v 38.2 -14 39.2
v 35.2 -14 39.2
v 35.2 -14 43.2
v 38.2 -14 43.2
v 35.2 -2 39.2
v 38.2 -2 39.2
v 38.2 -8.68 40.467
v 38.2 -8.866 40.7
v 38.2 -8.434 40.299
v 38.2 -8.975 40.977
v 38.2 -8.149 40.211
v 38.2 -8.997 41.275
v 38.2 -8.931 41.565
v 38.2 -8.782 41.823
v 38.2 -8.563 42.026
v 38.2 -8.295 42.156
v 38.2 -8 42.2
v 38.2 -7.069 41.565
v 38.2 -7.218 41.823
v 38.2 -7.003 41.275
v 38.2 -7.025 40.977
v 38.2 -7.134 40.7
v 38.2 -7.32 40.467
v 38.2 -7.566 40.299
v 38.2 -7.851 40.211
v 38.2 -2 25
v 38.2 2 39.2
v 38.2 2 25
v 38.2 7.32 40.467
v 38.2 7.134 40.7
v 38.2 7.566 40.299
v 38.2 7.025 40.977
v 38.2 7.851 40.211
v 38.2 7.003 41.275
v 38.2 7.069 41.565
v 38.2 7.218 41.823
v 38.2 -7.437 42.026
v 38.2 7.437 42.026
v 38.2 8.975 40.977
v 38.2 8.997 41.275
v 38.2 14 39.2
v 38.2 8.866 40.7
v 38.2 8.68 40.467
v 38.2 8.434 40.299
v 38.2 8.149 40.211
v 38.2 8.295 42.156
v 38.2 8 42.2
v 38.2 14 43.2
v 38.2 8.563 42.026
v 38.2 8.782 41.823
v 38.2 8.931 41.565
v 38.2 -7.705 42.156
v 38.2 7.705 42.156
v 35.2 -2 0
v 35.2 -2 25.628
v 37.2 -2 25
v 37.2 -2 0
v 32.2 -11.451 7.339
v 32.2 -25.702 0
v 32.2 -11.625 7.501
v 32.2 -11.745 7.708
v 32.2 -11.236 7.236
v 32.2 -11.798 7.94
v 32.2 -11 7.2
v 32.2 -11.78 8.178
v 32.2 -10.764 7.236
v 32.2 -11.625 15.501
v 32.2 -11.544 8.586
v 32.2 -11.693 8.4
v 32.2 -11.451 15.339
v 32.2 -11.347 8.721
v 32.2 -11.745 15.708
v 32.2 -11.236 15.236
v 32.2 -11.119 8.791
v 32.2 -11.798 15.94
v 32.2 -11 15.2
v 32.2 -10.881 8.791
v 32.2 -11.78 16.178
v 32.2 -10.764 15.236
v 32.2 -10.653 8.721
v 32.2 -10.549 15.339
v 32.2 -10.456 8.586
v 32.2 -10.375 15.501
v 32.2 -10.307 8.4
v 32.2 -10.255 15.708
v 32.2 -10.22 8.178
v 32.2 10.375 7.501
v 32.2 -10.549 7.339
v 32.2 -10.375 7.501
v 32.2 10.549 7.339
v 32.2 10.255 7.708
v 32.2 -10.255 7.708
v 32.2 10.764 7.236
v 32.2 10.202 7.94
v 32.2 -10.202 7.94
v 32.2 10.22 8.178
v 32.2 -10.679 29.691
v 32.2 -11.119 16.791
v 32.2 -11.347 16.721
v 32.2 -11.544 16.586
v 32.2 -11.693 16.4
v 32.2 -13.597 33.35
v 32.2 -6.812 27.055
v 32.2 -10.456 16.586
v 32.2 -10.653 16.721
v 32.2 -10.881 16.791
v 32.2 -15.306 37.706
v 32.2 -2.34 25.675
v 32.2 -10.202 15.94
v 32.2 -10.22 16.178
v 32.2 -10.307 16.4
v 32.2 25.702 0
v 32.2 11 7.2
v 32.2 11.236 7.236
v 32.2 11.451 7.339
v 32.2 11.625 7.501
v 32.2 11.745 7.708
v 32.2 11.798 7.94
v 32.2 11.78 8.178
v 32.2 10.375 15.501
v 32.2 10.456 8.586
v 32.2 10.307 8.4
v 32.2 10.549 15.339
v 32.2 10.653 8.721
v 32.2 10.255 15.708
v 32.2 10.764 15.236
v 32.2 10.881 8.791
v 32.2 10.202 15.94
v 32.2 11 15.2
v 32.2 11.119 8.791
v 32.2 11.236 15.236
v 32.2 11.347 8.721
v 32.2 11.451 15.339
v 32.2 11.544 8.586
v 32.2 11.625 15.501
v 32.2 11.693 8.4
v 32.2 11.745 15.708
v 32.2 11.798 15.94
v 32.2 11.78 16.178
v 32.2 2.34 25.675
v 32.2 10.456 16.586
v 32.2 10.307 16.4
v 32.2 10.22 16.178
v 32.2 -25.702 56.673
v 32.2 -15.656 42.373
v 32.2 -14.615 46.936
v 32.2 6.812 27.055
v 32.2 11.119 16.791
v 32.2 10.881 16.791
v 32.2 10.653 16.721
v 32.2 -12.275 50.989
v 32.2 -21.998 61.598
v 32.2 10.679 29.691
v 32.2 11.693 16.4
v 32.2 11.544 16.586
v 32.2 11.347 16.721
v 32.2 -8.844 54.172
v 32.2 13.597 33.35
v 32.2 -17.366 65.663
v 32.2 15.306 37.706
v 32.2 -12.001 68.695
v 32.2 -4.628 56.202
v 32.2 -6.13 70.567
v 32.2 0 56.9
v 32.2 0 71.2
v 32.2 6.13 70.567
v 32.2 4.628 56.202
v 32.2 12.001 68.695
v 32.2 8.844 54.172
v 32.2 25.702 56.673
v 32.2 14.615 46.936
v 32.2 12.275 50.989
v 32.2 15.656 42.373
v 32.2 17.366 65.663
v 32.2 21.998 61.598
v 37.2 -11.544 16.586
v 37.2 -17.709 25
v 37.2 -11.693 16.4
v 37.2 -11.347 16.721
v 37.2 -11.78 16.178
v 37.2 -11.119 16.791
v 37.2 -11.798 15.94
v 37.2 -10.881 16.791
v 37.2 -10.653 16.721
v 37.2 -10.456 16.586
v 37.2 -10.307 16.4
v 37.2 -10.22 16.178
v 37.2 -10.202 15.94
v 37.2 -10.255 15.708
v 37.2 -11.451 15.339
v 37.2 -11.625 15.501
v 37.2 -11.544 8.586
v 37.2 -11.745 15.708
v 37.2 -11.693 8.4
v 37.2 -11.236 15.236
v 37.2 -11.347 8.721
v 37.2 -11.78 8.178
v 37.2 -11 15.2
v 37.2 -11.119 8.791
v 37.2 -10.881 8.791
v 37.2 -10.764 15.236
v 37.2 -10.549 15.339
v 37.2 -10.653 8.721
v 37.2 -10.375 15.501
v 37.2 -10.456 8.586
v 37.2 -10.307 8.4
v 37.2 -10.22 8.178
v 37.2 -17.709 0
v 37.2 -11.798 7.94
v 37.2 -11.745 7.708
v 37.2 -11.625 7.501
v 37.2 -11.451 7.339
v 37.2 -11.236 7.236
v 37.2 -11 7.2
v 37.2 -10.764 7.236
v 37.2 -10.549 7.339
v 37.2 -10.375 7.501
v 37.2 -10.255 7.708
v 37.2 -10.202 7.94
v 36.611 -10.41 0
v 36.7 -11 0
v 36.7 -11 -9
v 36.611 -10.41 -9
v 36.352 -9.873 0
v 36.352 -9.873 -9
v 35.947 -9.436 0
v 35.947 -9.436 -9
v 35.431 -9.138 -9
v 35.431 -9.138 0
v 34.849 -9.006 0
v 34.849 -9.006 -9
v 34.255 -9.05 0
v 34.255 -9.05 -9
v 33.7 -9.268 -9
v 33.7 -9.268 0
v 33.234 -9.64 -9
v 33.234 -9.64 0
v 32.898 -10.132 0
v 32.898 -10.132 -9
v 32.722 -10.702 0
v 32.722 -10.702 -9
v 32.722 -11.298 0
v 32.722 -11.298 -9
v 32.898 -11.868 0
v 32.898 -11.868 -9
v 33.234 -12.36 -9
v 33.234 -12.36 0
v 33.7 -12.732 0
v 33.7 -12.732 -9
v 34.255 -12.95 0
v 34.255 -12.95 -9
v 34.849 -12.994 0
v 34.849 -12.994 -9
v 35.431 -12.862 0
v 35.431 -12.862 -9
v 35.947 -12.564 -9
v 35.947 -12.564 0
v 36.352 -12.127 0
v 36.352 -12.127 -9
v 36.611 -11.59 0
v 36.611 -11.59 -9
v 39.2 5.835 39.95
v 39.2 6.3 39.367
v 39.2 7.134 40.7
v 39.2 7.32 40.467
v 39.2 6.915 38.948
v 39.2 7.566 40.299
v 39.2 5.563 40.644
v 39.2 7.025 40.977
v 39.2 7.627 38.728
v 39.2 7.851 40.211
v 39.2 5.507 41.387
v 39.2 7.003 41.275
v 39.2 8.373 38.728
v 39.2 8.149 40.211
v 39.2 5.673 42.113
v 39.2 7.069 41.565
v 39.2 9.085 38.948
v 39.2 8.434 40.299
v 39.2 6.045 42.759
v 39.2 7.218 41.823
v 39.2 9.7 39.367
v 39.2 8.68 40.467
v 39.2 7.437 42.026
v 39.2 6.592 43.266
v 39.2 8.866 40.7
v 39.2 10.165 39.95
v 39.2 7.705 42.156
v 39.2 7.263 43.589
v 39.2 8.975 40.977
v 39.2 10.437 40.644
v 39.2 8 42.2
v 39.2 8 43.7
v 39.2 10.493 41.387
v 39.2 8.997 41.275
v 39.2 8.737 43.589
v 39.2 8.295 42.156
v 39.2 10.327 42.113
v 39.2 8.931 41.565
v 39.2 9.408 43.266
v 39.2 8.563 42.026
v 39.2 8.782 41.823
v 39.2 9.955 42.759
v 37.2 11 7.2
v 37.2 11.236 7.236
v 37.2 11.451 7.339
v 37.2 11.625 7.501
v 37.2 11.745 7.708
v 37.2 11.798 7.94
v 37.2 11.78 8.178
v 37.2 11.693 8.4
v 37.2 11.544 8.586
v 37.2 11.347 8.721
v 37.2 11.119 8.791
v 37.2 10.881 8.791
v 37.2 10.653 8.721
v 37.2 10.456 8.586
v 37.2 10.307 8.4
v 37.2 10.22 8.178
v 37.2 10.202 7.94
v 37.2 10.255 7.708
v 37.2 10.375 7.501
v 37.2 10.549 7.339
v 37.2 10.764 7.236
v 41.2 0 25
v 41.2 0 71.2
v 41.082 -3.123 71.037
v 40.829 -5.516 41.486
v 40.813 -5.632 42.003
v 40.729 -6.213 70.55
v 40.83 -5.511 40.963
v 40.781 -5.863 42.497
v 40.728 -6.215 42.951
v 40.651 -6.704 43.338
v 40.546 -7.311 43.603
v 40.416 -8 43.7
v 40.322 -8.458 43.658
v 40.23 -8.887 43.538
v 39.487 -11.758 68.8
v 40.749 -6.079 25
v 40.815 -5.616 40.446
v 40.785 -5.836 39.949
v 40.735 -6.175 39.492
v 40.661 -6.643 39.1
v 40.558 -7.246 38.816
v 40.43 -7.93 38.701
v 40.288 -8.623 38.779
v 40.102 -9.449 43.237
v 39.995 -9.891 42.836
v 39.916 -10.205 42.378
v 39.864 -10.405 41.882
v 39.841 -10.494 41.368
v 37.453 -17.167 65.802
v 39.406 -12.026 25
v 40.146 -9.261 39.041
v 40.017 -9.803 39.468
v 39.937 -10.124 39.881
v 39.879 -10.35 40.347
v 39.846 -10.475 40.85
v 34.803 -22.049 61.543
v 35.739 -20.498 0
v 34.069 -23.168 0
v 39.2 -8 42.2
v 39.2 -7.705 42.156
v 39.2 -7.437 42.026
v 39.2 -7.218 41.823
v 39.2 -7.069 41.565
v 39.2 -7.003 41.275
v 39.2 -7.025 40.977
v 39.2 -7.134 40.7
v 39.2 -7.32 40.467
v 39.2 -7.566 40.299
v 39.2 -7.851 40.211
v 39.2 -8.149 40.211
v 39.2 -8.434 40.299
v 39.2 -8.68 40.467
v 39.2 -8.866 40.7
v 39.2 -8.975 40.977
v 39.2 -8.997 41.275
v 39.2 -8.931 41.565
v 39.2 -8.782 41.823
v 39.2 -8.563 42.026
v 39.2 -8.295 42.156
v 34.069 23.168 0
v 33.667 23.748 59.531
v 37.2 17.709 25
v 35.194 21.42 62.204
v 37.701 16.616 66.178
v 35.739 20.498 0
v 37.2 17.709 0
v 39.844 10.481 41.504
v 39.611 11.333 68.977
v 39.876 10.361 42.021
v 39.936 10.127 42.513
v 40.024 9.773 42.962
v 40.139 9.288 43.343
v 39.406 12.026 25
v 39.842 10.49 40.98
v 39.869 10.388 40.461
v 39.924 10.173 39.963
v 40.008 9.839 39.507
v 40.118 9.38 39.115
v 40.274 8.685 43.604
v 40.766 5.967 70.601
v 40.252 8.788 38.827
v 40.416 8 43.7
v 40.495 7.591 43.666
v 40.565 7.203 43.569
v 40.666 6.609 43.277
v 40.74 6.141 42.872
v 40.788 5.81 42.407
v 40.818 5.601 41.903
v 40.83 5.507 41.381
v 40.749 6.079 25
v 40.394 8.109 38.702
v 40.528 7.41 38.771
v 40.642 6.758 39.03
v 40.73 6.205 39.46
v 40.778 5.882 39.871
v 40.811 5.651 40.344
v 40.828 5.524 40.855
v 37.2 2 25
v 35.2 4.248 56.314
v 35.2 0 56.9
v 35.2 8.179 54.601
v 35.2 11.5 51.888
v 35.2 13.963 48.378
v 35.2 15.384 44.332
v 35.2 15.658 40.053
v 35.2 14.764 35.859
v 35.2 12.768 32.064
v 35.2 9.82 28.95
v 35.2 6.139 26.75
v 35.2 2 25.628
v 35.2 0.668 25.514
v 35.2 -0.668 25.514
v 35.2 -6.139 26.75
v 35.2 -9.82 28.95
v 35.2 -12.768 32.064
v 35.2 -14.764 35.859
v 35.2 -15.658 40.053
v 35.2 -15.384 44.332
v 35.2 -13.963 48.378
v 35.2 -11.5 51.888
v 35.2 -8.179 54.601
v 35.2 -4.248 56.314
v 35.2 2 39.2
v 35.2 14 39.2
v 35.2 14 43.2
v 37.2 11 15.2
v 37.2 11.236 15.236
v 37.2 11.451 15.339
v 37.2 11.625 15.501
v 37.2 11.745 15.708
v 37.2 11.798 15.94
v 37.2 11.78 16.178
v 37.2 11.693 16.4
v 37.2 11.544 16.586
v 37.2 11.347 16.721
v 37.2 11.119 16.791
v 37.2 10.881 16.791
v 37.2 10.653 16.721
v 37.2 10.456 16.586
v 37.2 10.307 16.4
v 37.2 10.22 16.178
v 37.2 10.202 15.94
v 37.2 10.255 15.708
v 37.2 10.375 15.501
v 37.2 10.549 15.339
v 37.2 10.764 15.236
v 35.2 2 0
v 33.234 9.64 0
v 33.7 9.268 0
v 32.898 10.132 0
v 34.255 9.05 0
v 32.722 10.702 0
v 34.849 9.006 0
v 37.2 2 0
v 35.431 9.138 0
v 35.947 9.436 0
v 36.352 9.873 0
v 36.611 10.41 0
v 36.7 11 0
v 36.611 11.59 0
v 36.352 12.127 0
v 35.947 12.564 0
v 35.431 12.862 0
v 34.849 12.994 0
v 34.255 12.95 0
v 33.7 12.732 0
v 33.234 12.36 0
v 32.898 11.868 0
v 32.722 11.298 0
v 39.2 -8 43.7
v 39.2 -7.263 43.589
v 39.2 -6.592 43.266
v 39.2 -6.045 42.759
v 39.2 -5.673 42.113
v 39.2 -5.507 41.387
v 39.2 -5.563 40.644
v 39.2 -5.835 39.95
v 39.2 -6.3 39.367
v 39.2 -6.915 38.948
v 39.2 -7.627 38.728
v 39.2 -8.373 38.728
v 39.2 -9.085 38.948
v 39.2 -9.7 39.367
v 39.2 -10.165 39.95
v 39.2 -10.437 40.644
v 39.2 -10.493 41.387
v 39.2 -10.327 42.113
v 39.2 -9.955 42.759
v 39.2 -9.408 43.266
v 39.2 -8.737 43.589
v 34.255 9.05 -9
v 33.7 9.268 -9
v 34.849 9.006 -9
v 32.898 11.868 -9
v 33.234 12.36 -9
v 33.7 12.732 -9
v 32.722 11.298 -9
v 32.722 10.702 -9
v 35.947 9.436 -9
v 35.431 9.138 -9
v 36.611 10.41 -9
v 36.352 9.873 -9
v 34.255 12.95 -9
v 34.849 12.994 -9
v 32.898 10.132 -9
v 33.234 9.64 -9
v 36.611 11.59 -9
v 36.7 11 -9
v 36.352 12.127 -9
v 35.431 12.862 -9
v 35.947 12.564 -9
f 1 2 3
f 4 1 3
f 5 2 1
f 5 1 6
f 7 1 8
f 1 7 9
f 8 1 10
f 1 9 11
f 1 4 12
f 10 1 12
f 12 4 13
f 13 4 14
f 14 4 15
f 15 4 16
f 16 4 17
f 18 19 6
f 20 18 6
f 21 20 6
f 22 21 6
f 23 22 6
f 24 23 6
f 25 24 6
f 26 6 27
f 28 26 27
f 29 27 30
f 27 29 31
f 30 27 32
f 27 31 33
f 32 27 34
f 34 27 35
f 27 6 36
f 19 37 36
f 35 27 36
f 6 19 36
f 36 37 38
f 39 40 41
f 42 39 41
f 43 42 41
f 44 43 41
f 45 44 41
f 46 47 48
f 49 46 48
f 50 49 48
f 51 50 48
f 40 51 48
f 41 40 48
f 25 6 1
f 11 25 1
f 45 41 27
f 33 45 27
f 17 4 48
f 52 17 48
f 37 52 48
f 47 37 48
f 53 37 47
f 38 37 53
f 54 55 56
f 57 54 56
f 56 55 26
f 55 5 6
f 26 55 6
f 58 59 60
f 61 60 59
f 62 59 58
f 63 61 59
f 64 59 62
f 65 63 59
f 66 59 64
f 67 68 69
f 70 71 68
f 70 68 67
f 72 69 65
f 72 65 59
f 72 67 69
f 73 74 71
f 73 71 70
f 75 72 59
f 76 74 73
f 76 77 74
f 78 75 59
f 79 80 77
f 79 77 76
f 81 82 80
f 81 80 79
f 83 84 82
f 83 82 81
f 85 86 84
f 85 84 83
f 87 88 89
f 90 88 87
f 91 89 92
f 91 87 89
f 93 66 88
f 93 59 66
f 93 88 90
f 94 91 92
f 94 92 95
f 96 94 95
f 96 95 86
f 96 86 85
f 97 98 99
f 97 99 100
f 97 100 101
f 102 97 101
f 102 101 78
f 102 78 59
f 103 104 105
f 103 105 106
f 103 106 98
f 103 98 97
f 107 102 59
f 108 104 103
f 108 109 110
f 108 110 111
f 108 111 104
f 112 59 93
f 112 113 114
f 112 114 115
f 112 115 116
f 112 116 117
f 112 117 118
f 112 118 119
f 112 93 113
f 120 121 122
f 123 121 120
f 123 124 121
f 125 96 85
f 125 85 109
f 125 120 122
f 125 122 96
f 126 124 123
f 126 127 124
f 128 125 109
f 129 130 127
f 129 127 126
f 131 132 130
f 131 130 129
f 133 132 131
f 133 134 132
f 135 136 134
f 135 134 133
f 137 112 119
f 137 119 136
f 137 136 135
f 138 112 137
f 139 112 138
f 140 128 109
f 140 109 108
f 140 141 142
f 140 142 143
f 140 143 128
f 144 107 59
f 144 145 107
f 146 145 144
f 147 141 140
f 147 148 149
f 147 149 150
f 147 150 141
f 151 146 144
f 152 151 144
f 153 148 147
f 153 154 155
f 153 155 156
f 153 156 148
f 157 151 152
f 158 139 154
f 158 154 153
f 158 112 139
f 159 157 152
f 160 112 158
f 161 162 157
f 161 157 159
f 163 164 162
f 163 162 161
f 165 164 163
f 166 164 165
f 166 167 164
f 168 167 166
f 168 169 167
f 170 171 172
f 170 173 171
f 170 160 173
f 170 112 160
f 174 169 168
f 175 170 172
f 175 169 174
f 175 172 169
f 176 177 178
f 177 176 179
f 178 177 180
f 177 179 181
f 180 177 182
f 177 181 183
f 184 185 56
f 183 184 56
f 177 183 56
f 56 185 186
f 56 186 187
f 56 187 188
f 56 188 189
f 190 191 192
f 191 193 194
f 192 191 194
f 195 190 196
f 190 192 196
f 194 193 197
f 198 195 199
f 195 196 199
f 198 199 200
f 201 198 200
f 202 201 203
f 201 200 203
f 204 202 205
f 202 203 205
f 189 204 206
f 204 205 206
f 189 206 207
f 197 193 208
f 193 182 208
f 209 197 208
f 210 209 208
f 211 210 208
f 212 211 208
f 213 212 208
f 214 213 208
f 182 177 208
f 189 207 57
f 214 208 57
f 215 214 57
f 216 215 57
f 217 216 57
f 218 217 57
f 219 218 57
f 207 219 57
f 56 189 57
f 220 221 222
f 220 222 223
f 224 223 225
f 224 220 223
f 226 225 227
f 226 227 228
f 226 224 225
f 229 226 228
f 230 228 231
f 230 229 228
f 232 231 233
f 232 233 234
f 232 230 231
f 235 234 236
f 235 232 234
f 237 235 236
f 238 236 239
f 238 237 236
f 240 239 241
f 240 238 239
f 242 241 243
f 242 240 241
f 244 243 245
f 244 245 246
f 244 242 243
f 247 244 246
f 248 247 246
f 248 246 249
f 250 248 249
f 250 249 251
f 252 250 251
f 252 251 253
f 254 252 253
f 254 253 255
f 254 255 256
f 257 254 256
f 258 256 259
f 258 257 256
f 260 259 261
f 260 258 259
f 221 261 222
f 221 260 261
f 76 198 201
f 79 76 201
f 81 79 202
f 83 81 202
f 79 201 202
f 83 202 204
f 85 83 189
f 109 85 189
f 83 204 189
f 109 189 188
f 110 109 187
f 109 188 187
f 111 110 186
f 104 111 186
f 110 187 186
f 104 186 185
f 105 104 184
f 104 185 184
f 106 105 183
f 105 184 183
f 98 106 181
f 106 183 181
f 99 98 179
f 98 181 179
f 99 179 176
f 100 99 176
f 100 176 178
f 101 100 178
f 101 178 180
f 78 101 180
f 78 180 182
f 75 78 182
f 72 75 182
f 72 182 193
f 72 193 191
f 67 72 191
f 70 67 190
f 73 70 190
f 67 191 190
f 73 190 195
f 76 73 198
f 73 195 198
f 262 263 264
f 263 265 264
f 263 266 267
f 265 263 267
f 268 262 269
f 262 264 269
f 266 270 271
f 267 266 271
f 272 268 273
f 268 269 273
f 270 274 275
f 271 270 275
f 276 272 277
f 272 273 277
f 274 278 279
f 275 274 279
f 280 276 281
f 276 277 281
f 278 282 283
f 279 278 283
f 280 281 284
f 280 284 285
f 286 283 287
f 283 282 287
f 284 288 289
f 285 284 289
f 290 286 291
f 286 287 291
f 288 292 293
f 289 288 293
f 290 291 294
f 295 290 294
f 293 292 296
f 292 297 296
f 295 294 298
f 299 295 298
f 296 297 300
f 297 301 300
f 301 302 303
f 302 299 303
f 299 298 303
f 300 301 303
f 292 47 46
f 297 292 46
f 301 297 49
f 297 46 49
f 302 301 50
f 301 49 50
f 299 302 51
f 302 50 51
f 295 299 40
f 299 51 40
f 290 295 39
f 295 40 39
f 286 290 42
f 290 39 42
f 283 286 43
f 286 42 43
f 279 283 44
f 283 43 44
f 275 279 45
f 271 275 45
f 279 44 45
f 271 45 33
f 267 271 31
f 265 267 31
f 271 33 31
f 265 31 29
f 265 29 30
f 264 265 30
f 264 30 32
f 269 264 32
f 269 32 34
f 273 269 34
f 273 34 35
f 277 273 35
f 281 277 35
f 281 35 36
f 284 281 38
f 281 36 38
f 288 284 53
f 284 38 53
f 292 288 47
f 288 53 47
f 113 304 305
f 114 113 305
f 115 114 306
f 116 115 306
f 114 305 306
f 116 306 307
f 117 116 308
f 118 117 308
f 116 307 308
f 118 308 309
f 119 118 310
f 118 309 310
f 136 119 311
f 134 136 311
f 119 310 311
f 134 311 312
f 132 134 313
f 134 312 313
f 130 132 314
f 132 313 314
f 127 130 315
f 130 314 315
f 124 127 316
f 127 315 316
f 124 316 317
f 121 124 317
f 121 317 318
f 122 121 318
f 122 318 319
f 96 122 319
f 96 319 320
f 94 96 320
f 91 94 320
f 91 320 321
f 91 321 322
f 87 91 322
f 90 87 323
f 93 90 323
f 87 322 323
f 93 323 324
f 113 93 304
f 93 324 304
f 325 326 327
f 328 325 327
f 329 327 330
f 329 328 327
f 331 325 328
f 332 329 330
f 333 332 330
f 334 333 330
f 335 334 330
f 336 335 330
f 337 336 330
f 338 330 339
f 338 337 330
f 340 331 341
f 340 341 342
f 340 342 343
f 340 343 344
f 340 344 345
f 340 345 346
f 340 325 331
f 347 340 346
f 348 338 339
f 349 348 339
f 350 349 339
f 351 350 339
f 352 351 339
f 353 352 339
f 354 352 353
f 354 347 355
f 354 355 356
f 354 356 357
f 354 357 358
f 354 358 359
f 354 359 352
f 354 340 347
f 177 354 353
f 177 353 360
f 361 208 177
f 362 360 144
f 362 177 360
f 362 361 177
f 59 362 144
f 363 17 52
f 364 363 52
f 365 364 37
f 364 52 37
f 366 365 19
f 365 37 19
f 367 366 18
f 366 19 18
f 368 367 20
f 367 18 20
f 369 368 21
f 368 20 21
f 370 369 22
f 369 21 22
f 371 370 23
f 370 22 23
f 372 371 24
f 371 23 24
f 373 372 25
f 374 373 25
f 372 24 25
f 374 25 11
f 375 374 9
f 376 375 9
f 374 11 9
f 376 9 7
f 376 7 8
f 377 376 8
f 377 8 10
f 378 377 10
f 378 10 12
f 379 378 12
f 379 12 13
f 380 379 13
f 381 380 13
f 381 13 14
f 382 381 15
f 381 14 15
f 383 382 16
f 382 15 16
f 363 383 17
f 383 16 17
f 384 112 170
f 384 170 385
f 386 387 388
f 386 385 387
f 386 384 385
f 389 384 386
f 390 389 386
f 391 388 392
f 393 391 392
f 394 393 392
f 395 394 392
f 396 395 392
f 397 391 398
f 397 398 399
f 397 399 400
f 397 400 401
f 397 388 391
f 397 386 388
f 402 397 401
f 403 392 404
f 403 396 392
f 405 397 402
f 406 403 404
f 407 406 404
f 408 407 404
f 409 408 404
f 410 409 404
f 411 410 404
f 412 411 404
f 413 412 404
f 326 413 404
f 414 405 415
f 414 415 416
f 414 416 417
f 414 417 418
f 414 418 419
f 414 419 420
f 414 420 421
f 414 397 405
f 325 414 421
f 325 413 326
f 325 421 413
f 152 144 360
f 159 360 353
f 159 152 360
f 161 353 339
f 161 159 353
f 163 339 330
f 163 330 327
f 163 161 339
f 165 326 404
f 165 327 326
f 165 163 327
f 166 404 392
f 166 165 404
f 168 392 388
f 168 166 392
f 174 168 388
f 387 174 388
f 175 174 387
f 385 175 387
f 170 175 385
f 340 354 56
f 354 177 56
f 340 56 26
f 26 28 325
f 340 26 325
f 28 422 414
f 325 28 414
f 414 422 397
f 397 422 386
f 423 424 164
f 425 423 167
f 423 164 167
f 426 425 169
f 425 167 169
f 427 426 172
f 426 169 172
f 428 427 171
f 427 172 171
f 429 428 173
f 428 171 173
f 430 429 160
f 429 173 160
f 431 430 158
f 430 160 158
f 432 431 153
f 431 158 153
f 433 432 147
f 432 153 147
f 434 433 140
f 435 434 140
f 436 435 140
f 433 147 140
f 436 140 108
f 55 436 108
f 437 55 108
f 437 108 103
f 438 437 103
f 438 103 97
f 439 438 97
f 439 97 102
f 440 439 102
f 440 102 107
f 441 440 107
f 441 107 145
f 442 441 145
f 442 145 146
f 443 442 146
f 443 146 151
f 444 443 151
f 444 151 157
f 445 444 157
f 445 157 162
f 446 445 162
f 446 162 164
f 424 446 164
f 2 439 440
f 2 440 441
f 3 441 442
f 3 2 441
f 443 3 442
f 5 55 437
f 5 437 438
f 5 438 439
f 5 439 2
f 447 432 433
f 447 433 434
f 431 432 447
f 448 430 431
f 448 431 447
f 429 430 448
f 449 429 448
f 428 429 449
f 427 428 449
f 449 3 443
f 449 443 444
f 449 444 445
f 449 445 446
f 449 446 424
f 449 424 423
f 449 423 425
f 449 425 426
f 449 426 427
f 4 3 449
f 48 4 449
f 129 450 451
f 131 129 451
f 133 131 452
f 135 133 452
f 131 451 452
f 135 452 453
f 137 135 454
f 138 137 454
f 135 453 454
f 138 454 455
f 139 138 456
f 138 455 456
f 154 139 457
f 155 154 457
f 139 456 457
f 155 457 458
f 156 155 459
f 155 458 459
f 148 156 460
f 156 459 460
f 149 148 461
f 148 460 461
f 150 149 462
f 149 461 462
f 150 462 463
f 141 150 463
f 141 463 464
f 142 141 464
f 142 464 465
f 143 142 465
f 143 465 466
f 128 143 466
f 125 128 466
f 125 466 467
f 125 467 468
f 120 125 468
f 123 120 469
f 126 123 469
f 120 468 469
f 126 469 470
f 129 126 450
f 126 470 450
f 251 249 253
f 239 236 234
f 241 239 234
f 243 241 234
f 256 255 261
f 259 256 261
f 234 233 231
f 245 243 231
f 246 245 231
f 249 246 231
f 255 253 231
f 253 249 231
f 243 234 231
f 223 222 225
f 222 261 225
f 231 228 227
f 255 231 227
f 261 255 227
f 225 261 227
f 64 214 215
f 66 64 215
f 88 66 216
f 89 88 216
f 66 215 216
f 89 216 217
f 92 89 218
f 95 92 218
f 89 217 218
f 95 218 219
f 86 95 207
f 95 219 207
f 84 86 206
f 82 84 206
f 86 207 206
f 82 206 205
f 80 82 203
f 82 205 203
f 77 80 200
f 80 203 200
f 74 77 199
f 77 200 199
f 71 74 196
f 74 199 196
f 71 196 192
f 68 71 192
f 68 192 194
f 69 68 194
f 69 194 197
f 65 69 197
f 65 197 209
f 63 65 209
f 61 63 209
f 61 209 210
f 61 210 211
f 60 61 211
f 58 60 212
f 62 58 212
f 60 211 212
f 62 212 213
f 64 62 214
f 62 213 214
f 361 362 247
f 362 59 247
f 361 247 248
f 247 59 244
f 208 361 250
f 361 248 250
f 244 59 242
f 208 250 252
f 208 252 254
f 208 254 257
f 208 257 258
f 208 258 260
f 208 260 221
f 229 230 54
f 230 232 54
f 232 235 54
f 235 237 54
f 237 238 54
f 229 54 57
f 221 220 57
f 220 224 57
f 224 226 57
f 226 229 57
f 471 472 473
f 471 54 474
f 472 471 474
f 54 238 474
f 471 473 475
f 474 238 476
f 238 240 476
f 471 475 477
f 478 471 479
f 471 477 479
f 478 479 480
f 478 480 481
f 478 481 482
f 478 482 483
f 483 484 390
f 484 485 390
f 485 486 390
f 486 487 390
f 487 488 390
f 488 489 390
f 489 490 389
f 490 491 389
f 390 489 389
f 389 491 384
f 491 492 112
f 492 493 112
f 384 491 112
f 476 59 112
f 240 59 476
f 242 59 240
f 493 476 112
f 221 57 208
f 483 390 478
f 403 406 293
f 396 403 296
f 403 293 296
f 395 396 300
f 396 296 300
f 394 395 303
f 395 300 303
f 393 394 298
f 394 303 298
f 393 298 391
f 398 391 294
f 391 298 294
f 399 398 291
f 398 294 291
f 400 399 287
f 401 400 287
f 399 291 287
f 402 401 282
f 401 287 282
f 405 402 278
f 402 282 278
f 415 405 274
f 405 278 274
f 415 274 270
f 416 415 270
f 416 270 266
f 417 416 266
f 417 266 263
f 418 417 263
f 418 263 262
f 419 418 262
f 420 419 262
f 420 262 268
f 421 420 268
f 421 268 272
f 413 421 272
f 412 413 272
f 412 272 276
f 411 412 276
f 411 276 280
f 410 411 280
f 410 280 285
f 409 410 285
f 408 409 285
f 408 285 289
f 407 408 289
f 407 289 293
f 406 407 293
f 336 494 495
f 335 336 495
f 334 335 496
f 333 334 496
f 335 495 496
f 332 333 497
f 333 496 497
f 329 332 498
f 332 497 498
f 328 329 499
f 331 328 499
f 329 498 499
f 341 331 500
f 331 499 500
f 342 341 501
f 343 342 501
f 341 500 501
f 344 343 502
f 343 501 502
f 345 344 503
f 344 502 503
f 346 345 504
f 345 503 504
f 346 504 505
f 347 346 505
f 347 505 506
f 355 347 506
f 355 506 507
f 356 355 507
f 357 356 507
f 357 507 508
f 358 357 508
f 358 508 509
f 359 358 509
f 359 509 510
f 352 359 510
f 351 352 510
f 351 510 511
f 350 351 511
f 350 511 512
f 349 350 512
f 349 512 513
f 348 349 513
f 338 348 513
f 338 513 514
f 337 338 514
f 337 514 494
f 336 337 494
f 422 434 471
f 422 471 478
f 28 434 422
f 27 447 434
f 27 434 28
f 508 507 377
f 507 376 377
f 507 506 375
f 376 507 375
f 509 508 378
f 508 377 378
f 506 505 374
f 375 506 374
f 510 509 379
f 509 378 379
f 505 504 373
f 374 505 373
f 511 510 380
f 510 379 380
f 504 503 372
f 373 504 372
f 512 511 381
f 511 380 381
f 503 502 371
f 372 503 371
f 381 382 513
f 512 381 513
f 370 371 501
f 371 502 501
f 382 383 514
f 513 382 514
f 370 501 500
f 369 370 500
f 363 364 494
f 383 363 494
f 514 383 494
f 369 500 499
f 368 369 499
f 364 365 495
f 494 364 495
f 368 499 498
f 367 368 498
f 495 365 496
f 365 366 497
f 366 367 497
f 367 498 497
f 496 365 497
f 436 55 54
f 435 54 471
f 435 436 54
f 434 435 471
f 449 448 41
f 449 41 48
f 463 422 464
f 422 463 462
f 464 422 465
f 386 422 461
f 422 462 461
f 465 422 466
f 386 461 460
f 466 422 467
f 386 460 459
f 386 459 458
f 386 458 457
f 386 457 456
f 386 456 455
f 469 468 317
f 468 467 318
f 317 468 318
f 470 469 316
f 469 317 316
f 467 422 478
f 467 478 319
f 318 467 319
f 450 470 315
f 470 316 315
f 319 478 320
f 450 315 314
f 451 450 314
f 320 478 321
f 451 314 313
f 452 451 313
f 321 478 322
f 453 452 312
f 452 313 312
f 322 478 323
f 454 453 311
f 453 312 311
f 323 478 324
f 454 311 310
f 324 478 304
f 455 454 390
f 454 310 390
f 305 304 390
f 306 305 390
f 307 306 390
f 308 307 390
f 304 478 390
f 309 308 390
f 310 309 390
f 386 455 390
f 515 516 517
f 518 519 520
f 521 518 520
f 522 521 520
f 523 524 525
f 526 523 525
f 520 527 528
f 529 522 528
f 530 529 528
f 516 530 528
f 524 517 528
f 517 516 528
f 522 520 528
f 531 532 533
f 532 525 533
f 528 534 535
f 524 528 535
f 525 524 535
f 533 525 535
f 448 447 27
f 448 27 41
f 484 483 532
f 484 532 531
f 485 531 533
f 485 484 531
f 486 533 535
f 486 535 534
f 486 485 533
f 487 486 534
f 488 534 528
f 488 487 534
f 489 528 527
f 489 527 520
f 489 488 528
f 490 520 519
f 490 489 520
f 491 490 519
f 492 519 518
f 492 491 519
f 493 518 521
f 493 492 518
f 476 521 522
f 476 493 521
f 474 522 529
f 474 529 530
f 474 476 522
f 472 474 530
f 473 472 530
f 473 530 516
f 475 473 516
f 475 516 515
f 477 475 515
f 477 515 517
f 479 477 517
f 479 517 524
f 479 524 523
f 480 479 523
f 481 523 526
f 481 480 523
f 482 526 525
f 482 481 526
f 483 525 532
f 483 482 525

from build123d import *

# Parameters (mm, degrees)
SKETCH_1_W          = 9
SKETCH_1_H          = 60
EXTRUDE_1_DEPTH     = 41.2
SKETCH_4_R          = 30
EXTRUDE_3_DEPTH     = 9
CUT_EXTRUDE_1_DEPTH = 72
SKETCH_5_R          = 15.7
CUT_EXTRUDE_2_DEPTH = 3
SKETCH_6_W          = 4
SKETCH_6_H          = 28
CUT_EXTRUDE_3_DEPTH = 3
SKETCH_7_W          = 3
SKETCH_7_H          = 4
CUT_EXTRUDE_4_DEPTH = 39.2
SKETCH_8_W          = 4
SKETCH_8_H          = 82.4
CUT_EXTRUDE_5_DEPTH = 25
SKETCH_9_R          = 2
EXTRUDE_4_DEPTH     = 9
SKETCH_10_R         = 0.8
CUT_EXTRUDE_6_DEPTH = 5
SKETCH_11_R         = 1
CUT_EXTRUDE_7_DEPTH = 1
SKETCH_12_R         = 2.5
CUT_EXTRUDE_9_DEPTH = 2


with BuildPart() as part:
    # 草图1 → 凸台-拉伸1 (new body)
    with BuildSketch(Plane.XY):
        with Locations((36.7, 0)):
            Rectangle(SKETCH_1_W, SKETCH_1_H)
    extrude(amount=EXTRUDE_1_DEPTH)

    # 草图4 → 凸台-拉伸3 (add)
    with BuildSketch(Plane.ZY.offset(-32.2)):
        with Locations((41.2, 0)):
            Circle(SKETCH_4_R)
    extrude(amount=-EXTRUDE_3_DEPTH)

    # 切除-拉伸1: read off the stored shape, not the designer's step
    # 切除-拉伸1 outline → 切除-拉伸1 (cut)
    with BuildSketch(Plane.XY):
        with BuildLine():
            Line((32.2, 30), (32.2, 25.702139989))
            ThreePointArc((32.2, 25.702139989), (38.884958532, 13.616166862), (41.2, 0))
            Line((41.2, 0), (41.2, 30))
            Line((41.2, 30), (32.2, 30))
        make_face()
        with BuildLine():
            Line((41.2, -30), (41.2, 0))
            ThreePointArc((41.2, 0), (38.884958532, -13.616166862), (32.2, -25.702139989))
            Line((32.2, -25.702139989), (32.2, -30))
            Line((32.2, -30), (41.2, -30))
        make_face()
    extrude(amount=CUT_EXTRUDE_1_DEPTH, mode=Mode.SUBTRACT)

    # 草图5 → 切除-拉伸2 (cut)
    with BuildSketch(Plane.ZY.offset(-32.2)):
        with Locations((41.2, 0)):
            Circle(SKETCH_5_R)
    extrude(amount=-CUT_EXTRUDE_2_DEPTH, mode=Mode.SUBTRACT)

    # 草图6 → 切除-拉伸3 (cut)
    with BuildSketch(Plane.ZY.offset(-35.2)):
        with Locations((41.2, 0)):
            Rectangle(SKETCH_6_W, SKETCH_6_H)
    extrude(amount=-CUT_EXTRUDE_3_DEPTH, mode=Mode.SUBTRACT)

    # 草图7 → 切除-拉伸4 (cut)
    with BuildSketch(Plane.XY.offset(39.2)):
        with Locations((36.7, 0)):
            Rectangle(SKETCH_7_W, SKETCH_7_H)
    extrude(amount=-CUT_EXTRUDE_4_DEPTH, mode=Mode.SUBTRACT)

    # 草图8 → 切除-拉伸5 (cut)
    with BuildSketch(Plane.XY):
        with Locations((39.2, 0)):
            Rectangle(SKETCH_8_W, SKETCH_8_H)
    extrude(amount=CUT_EXTRUDE_5_DEPTH, mode=Mode.SUBTRACT)

    # 草图9 → 凸台-拉伸4 (add)
    with BuildSketch(Plane.XY):
        with Locations((34.7, 11)):
            Circle(SKETCH_9_R)
        with Locations((34.7, -11)):
            Circle(SKETCH_9_R)
    extrude(amount=-EXTRUDE_4_DEPTH)

    # 草图10 → 切除-拉伸6 (cut)
    with BuildSketch(Plane(origin=(37.2, 0, 0), x_dir=(0, 0, -1), z_dir=(1, 0, 0))):
        with Locations((-16, -11)):
            Circle(SKETCH_10_R)
        with Locations((-8, -11)):
            Circle(SKETCH_10_R)
        with Locations((-16, 11)):
            Circle(SKETCH_10_R)
        with Locations((-8, 11)):
            Circle(SKETCH_10_R)
    extrude(amount=-CUT_EXTRUDE_6_DEPTH, mode=Mode.SUBTRACT)

    # 草图11 → 切除-拉伸7 (cut)
    with BuildSketch(Plane.ZY.offset(-38.2)):
        with Locations((41.2, 8)):
            Circle(SKETCH_11_R)
        with Locations((41.2, -8)):
            Circle(SKETCH_11_R)
    extrude(amount=-CUT_EXTRUDE_7_DEPTH, mode=Mode.SUBTRACT)

    # 草图12 → 切除-拉伸9 (cut)
    with BuildSketch(Plane.ZY.offset(-39.2)):
        with Locations((41.2, 8)):
            Circle(SKETCH_12_R)
        with Locations((41.2, -8)):
            Circle(SKETCH_12_R)
    extrude(amount=-CUT_EXTRUDE_9_DEPTH, mode=Mode.SUBTRACT)


solid = part.part
